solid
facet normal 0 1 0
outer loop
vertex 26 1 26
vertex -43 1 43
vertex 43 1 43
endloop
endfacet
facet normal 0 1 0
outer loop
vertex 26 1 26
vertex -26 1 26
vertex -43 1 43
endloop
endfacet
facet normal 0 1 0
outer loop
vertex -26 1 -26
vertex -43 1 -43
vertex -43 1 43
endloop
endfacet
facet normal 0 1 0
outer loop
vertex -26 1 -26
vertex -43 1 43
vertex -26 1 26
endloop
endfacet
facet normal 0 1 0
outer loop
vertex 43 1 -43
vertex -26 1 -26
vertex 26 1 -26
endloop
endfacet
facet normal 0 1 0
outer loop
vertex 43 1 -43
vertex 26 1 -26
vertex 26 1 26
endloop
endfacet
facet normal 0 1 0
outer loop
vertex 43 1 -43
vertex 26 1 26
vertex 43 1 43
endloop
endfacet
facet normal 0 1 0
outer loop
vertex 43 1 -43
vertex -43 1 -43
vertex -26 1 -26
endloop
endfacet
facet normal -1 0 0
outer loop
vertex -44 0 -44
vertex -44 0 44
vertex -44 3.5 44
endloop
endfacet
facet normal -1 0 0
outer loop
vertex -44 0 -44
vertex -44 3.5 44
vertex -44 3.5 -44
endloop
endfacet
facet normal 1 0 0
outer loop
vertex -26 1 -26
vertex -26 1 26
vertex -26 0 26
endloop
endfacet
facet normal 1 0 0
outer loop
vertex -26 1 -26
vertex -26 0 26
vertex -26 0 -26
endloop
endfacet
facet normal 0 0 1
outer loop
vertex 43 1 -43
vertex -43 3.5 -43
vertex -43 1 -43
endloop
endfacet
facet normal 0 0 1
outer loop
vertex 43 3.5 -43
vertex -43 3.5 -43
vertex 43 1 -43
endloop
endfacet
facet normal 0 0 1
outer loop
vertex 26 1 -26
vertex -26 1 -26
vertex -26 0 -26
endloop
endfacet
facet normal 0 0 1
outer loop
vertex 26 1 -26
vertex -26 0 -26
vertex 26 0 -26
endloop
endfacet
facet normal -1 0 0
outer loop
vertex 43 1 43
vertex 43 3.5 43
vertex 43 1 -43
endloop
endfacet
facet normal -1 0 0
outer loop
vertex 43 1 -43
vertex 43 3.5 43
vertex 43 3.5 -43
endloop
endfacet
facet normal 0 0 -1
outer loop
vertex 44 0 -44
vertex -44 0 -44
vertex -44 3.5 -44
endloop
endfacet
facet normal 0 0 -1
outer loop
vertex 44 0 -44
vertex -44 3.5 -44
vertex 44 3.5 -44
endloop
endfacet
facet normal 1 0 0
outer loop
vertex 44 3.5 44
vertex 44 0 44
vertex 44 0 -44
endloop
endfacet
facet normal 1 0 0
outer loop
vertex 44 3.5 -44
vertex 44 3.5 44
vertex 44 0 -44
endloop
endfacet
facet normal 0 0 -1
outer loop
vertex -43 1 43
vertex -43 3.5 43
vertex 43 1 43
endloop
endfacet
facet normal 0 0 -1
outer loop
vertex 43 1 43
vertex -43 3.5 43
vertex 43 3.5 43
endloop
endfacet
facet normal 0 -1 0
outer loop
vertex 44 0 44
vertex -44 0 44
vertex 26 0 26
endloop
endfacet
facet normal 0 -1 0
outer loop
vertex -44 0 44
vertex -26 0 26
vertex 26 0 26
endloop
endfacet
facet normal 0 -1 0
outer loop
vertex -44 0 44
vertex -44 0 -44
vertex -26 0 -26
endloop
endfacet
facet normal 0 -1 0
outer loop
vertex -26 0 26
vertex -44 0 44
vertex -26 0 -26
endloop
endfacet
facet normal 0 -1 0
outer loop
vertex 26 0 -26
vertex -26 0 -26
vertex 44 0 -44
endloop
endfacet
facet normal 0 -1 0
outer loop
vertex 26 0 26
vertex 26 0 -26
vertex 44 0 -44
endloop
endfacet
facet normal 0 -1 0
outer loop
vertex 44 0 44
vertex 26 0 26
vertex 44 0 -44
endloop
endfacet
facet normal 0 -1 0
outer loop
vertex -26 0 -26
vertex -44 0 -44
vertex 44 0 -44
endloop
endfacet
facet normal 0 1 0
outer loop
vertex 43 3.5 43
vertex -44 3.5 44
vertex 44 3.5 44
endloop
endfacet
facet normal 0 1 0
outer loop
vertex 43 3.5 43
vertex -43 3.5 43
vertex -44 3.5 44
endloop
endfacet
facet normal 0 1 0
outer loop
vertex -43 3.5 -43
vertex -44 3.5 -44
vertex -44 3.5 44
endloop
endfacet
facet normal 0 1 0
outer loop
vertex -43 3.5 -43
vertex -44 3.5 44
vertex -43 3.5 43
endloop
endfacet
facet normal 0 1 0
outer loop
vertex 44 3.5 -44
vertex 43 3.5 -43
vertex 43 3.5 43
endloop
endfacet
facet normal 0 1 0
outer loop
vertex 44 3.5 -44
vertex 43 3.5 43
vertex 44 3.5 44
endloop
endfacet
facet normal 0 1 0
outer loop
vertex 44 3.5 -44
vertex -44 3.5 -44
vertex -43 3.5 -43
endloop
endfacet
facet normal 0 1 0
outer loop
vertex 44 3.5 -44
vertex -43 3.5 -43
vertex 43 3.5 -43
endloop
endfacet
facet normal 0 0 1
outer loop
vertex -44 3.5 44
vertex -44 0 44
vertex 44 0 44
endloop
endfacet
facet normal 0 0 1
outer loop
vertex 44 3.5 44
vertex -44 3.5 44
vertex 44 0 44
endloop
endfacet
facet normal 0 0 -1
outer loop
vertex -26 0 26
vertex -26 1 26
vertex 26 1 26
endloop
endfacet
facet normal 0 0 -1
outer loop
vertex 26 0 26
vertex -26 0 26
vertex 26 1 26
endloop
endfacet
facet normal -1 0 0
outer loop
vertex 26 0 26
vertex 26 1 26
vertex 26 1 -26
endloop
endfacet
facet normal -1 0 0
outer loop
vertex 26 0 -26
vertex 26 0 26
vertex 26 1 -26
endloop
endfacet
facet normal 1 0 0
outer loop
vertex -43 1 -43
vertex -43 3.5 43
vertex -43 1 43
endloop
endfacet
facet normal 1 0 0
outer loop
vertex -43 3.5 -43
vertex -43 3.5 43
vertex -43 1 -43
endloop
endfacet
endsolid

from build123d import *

# Parameters (mm, degrees)
SKETCH1_W           = 88
SKETCH1_H           = 88
BOSS_EXTRUDE1_DEPTH = 3.5
SKETCH2_W           = 86
SKETCH2_H           = 86
CUT_EXTRUDE1_DEPTH  = 2.5
SKETCH3_W           = 52
SKETCH3_H           = 52
CUT_EXTRUDE2_DEPTH  = 2


with BuildPart() as part:
    # Sketch1 → Boss-Extrude1 (new body)
    with BuildSketch(Plane(origin=(0, 0, 0), x_dir=(1, 0, 0), z_dir=(0, 1, 0))):
        Rectangle(SKETCH1_W, SKETCH1_H)
    extrude(amount=BOSS_EXTRUDE1_DEPTH)

    # Sketch2 → Cut-Extrude1 (cut)
    with BuildSketch(Plane(origin=(0, 3.5, 0), x_dir=(1, 0, 0), z_dir=(0, 1, 0))):
        Rectangle(SKETCH2_W, SKETCH2_H)
    extrude(amount=-CUT_EXTRUDE1_DEPTH, mode=Mode.SUBTRACT)

    # Sketch3 → Cut-Extrude2 (cut, through all)
    with BuildSketch(Plane(origin=(0, 1, 0), x_dir=(1, 0, 0), z_dir=(0, 1, 0))):
        Rectangle(SKETCH3_W, SKETCH3_H)
    extrude(amount=-CUT_EXTRUDE2_DEPTH, mode=Mode.SUBTRACT)


solid = part.part
